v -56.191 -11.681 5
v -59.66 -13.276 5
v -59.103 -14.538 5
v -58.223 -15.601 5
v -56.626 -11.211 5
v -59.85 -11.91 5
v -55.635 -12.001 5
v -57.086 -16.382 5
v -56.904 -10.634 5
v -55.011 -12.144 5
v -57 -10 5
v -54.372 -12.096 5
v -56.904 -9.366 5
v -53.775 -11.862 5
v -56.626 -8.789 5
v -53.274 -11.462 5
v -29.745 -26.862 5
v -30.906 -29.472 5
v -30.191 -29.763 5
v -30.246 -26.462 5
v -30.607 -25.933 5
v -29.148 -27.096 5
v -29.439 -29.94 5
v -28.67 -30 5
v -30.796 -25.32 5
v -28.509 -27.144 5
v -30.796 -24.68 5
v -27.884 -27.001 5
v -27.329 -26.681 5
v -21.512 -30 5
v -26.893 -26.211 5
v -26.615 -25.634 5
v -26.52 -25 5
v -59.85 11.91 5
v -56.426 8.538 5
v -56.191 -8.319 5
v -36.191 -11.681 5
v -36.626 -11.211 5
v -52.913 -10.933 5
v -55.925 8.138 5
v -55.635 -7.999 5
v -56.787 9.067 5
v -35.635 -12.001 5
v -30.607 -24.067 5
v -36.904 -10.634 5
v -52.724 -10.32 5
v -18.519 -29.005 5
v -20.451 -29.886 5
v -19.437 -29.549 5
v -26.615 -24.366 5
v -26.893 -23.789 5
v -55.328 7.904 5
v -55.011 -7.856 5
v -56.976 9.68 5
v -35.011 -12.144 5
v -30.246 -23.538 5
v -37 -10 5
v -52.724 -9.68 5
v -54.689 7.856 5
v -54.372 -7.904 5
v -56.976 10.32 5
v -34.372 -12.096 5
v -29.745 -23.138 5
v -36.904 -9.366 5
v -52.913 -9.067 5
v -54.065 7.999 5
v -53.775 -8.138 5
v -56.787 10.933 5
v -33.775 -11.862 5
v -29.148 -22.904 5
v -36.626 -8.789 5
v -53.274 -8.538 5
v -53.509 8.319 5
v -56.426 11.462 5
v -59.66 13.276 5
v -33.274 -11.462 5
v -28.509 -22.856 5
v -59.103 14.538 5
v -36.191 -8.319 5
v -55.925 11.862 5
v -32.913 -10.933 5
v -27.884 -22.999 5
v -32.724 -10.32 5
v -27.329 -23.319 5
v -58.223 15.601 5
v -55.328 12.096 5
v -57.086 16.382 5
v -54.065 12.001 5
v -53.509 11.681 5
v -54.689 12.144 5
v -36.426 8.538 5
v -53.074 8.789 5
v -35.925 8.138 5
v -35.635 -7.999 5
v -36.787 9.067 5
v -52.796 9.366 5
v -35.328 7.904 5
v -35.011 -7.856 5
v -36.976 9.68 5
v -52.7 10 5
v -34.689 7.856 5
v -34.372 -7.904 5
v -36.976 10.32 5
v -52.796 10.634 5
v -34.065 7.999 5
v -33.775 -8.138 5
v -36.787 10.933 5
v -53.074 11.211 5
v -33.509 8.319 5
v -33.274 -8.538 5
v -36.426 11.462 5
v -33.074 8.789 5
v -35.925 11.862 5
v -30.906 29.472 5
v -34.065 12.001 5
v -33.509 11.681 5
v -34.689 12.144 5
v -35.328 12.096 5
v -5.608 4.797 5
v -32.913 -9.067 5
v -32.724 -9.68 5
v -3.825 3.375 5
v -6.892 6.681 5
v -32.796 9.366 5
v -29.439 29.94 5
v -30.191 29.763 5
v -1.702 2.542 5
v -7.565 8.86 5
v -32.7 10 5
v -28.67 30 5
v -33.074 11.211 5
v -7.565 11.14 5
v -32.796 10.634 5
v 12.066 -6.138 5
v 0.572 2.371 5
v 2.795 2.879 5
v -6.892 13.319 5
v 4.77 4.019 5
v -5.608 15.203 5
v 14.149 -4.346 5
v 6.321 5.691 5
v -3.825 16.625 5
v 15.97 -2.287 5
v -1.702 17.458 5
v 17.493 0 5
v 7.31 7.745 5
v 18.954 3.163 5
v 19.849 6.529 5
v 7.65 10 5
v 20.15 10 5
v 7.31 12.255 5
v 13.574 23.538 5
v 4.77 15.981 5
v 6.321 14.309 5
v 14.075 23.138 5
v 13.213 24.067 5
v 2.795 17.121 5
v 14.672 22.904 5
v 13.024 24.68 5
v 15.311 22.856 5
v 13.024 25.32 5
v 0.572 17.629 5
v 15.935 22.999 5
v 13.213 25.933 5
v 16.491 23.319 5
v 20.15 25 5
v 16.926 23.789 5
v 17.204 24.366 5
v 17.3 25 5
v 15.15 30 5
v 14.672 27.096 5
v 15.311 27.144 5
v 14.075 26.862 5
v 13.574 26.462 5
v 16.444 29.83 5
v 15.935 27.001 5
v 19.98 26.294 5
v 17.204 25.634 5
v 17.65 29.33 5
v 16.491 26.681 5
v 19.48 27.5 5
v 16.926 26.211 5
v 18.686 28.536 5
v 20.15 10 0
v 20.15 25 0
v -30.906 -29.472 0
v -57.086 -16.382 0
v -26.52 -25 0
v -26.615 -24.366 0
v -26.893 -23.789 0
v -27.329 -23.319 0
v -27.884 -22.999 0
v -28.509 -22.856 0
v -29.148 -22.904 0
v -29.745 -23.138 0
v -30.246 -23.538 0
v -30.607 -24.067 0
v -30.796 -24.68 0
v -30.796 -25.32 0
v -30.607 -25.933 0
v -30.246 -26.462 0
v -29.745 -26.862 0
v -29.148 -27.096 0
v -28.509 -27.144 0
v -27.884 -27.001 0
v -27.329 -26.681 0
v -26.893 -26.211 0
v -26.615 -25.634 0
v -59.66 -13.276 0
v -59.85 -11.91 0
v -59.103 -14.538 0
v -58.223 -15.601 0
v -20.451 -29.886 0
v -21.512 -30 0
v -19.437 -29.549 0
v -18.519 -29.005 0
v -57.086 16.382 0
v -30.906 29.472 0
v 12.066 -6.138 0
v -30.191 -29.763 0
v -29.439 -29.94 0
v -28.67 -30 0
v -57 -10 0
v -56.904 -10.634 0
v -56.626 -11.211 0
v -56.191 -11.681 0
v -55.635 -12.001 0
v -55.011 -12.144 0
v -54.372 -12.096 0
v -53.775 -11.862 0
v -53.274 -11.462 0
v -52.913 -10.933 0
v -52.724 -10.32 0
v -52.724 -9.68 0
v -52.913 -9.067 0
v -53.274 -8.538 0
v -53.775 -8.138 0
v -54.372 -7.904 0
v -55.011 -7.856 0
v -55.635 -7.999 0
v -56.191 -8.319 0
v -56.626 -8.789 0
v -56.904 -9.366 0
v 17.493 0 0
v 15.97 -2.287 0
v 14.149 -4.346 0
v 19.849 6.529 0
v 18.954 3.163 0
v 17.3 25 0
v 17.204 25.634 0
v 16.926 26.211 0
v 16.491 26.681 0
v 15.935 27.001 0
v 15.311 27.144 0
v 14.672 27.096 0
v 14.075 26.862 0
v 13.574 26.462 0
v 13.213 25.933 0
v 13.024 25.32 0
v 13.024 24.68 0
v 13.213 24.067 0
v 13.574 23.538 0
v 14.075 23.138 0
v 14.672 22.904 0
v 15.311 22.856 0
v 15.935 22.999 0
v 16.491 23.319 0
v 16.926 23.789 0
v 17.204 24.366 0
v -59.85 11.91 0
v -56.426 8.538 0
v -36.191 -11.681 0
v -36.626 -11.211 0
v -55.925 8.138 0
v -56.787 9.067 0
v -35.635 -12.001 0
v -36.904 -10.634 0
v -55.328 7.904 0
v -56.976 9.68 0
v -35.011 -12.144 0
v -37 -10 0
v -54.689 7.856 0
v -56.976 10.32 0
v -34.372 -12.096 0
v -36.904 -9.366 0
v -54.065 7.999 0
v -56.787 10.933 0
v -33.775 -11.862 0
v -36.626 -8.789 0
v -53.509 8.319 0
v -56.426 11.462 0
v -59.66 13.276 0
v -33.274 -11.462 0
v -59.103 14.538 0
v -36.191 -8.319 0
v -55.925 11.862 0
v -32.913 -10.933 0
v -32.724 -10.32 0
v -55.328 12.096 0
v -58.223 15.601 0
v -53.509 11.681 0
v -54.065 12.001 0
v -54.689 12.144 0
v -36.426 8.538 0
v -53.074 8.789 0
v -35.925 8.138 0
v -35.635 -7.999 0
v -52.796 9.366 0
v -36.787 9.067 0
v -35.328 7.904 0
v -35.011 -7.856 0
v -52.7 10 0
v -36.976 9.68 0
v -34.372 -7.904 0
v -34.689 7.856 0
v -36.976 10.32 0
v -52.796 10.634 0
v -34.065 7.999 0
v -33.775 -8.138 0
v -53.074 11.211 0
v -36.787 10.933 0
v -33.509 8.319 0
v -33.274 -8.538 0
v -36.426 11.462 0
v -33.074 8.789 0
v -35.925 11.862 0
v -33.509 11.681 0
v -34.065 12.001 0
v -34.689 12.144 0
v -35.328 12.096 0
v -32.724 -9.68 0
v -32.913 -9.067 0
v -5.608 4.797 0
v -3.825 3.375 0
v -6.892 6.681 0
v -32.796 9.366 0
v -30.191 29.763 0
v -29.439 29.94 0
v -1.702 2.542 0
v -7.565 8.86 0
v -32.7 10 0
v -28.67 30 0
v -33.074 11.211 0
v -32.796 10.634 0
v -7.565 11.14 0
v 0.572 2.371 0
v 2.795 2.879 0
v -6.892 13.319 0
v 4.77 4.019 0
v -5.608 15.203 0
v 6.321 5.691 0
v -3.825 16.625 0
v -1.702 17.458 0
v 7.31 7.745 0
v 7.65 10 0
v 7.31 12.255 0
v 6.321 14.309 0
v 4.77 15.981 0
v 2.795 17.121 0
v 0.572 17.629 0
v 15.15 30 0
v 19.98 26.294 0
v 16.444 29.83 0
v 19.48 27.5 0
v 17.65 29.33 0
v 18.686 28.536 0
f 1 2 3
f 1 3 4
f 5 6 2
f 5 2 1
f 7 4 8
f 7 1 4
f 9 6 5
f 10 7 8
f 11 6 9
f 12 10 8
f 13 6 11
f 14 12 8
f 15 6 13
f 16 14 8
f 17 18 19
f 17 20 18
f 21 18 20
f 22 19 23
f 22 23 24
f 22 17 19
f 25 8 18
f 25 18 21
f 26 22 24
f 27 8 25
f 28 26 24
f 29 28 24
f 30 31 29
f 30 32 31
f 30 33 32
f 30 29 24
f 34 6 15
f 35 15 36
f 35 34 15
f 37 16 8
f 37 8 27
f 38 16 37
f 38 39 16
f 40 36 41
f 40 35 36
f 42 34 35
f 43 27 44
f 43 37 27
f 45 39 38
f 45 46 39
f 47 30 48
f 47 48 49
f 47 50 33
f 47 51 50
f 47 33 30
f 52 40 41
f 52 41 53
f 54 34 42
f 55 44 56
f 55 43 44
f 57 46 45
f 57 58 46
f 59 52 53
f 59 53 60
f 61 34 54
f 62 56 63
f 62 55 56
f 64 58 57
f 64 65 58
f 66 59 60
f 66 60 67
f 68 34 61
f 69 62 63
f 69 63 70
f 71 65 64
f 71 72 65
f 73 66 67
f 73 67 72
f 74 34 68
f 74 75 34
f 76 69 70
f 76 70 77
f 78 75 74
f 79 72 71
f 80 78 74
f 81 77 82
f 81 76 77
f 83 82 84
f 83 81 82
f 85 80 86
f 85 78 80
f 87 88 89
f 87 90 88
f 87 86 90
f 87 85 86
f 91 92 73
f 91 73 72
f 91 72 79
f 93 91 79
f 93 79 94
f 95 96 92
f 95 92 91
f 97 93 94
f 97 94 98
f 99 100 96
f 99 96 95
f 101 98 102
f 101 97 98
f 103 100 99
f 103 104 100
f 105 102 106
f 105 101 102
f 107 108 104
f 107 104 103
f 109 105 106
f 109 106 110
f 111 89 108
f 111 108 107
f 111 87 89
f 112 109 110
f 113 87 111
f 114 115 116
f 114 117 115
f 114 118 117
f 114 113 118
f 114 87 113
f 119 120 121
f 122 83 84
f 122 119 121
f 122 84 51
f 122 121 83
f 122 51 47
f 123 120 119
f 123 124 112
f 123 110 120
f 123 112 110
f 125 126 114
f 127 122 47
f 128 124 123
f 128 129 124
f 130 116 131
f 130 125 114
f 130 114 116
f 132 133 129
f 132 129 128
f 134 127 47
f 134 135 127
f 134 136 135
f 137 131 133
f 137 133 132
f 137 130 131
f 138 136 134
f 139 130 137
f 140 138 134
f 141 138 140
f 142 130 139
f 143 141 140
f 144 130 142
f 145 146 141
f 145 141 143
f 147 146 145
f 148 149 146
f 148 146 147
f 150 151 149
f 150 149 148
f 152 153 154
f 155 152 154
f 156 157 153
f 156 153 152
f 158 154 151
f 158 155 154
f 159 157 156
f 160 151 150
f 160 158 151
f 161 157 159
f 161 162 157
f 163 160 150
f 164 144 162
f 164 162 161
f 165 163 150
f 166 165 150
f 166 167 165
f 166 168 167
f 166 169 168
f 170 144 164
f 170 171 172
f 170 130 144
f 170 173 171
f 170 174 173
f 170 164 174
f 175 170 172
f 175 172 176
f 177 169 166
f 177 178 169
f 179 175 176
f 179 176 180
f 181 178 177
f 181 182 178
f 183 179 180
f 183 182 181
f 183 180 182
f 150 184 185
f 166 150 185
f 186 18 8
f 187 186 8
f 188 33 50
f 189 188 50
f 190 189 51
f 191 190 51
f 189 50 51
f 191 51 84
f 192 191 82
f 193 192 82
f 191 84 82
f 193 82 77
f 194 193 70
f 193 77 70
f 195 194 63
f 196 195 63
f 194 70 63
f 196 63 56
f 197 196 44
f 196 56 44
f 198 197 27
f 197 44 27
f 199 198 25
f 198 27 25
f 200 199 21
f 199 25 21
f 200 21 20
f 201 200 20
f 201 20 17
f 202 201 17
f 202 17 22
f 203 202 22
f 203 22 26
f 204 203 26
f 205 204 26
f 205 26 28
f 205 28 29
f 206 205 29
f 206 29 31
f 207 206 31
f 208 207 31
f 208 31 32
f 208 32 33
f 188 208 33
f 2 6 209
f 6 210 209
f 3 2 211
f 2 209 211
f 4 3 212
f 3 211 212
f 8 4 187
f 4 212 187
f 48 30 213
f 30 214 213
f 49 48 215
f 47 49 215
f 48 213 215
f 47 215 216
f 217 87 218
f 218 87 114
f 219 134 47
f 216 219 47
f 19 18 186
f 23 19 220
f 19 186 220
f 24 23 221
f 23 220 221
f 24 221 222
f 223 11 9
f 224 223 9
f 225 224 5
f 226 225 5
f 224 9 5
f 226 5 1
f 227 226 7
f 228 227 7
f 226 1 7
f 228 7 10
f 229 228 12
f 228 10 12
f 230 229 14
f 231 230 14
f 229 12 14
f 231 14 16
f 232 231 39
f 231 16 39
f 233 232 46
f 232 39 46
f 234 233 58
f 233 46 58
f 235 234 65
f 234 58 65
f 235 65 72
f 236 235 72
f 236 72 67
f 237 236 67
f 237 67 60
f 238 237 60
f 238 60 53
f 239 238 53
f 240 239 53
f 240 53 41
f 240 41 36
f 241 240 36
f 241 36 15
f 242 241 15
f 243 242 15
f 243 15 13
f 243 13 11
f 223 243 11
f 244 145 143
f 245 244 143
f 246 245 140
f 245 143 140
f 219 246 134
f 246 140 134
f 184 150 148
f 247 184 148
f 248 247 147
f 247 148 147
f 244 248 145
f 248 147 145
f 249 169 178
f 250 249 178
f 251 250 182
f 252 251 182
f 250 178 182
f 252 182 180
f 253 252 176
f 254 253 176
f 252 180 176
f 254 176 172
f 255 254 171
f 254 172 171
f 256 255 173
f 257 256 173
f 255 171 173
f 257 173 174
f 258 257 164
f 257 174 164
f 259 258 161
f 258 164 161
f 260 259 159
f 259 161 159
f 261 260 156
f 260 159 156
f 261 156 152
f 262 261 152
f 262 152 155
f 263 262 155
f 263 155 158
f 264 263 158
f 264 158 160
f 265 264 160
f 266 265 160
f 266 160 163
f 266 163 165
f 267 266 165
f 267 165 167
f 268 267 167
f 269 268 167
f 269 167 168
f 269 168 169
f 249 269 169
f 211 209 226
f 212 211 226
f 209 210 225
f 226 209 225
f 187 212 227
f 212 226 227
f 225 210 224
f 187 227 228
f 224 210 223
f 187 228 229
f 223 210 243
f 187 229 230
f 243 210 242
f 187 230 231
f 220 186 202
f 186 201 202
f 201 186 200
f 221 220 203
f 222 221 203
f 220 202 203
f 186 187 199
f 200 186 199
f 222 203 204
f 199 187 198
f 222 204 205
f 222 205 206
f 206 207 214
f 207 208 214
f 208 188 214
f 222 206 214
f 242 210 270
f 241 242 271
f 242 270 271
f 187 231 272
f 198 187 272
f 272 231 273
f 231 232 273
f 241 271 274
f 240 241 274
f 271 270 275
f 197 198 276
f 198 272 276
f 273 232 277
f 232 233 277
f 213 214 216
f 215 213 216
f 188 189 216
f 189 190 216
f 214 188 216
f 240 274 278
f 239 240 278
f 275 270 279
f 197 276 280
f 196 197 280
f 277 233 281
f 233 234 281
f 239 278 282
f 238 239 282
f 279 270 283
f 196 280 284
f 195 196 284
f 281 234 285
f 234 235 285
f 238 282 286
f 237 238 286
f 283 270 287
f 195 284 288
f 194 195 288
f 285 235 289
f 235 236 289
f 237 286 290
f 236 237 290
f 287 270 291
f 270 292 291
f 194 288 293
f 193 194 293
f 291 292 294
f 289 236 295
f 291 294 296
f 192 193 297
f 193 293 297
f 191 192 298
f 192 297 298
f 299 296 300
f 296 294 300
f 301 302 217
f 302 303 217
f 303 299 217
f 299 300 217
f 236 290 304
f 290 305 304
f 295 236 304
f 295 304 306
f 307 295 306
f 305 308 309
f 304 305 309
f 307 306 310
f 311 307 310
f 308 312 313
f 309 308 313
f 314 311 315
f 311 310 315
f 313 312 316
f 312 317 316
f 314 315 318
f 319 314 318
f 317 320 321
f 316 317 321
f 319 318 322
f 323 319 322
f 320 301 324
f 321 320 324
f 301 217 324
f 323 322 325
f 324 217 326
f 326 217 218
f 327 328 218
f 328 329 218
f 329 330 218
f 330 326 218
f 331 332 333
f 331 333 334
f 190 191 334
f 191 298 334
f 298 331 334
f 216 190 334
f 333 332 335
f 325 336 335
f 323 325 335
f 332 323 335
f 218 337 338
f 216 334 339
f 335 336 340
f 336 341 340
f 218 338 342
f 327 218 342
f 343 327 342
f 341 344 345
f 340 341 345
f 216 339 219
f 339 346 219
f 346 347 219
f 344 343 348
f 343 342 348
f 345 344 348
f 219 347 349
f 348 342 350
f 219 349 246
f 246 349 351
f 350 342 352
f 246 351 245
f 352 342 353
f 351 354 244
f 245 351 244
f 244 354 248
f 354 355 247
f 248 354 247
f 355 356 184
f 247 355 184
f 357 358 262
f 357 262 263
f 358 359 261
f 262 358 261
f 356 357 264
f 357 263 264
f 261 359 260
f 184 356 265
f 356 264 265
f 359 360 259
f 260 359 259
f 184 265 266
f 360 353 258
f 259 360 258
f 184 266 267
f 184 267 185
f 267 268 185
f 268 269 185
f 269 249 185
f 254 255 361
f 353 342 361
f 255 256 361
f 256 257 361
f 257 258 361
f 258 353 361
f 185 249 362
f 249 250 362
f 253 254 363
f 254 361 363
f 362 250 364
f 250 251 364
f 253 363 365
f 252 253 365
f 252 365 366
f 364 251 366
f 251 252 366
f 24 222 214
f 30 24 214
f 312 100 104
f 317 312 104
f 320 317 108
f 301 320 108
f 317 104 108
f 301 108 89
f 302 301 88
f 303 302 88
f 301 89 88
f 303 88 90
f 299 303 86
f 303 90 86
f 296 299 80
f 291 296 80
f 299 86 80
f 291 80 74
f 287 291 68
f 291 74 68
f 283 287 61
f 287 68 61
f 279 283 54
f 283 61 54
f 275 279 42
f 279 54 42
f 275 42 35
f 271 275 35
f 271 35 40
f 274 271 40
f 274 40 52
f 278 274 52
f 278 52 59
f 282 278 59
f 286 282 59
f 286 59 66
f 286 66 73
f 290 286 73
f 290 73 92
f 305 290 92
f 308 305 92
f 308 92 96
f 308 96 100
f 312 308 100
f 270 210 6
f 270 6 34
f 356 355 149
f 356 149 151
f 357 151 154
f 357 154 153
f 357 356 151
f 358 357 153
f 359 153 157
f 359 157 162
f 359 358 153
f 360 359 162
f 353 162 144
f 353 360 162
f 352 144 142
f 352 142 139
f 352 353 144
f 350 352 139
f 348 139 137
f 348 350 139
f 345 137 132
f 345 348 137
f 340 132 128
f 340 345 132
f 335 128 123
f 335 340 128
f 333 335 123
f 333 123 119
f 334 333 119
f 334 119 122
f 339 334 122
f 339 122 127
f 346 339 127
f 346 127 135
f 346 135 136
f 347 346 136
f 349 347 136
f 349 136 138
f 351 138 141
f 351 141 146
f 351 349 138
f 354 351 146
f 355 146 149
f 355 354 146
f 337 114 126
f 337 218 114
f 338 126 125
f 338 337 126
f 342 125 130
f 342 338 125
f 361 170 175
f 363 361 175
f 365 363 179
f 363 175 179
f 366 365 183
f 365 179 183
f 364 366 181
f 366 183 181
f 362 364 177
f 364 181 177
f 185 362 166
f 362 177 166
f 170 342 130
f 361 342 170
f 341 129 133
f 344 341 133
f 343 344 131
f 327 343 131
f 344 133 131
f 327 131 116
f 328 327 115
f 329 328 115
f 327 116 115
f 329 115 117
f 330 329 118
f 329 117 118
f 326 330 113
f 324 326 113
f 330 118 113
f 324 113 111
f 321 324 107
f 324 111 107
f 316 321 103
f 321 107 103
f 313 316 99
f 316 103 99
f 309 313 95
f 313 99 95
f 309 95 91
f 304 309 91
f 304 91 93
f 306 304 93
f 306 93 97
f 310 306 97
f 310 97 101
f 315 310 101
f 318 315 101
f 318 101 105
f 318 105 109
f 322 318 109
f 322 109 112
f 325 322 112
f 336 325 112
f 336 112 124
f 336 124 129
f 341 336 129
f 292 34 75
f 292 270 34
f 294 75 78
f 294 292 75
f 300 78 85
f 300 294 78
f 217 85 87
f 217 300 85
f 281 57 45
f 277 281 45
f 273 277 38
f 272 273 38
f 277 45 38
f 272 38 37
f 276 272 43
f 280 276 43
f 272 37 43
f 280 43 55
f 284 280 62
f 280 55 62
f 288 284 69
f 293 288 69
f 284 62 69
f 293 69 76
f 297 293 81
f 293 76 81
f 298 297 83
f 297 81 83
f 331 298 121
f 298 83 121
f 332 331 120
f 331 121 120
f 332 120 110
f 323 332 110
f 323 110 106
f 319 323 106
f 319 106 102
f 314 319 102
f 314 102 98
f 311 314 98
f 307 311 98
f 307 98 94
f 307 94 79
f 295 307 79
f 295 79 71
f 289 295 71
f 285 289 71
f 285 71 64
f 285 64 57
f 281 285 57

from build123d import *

# Parameters (mm, degrees)
SKETCH_1_W          = 80
SKETCH_1_H          = 60
SKETCH_1_R          = 7.65
EXTRUDE_1_DEPTH     = 5
SKETCH_2_R          = 2.15
CUT_EXTRUDE_1_DEPTH = 68.134361545
SKETCH_3_R          = 2.15
CUT_EXTRUDE_2_DEPTH = 68.134361545
CUT_EXTRUDE_3_DEPTH = 68.134361545
SKETCH_6_R          = 2.15
CUT_EXTRUDE_5_DEPTH = 68.134361545
FILLET_1_R          = 5


with BuildPart() as part:
    # ｽｹｯﾁ1 → ﾎﾞｽ - 押し出し1 (new body)
    with BuildSketch(Plane.XY):
        with Locations((-19.85, 0)):
            Rectangle(SKETCH_1_W, SKETCH_1_H)
        with Locations((0, 10)):
            Circle(SKETCH_1_R, mode=Mode.SUBTRACT)
    extrude(amount=EXTRUDE_1_DEPTH)

    # ｽｹｯﾁ2 → ｶｯﾄ - 押し出し1 (cut, through all)
    with BuildSketch(Plane.XY.offset(5)):
        with Locations((-54.85, 10)):
            Circle(SKETCH_2_R)
        with Locations(Location((-54.85, -10, 0), (0, 0, 180))):
            Circle(SKETCH_2_R)
        with Locations((-34.85, 10)):
            Circle(SKETCH_2_R)
        with Locations(Location((-34.85, -10, 0), (0, 0, 180))):
            Circle(SKETCH_2_R)
    extrude(amount=-CUT_EXTRUDE_1_DEPTH, mode=Mode.SUBTRACT)

    # ｽｹｯﾁ3 → ｶｯﾄ - 押し出し2 (cut, through all)
    with BuildSketch(Plane.XY.offset(5)):
        with Locations((15.15, 25)):
            Circle(SKETCH_3_R)
        with BuildLine():
            ThreePointArc((15.15, 30), (18.685533906, 28.535533906), (20.15, 25))
            Line((20.15, 25), (20.15, 30))
            Line((20.15, 30), (15.15, 30))
        make_face()
    extrude(amount=-CUT_EXTRUDE_2_DEPTH, mode=Mode.SUBTRACT)

    # ｽｹｯﾁ4 → ｶｯﾄ - 押し出し3 (cut, through all)
    with BuildSketch(Plane.XY.offset(5)):
        Polygon((-59.85, 30), (-59.85, 15), (-29.85, 30), align=None)
        Polygon((-29.85, -30), (-59.85, -15), (-59.85, -30), align=None)
        with BuildLine():
            Line((20.15, 0), (17.493498792, 0))
            ThreePointArc((17.493498792, 0), (15.094907291, -3.347893986), (12.06572435, -6.138178209))
            Line((12.06572435, -6.138178209), (-19.85, -30))
            Line((-19.85, -30), (20.15, -30))
            Line((20.15, -30), (20.15, 0))
        make_face()
        with BuildLine():
            ThreePointArc((20.15, 10), (19.474553919, 4.8265824), (17.493498792, 0))
            Line((17.493498792, 0), (20.15, 0))
            Line((20.15, 0), (20.15, 10))
        make_face()
    extrude(amount=-CUT_EXTRUDE_3_DEPTH, mode=Mode.SUBTRACT)

    # ｽｹｯﾁ6 → ｶｯﾄ - 押し出し5 (cut, through all)
    with BuildSketch(Plane.XY.offset(5)):
        with Locations((-28.669660113, -25)):
            Circle(SKETCH_6_R)
    extrude(amount=-CUT_EXTRUDE_5_DEPTH, mode=Mode.SUBTRACT)

    # ﾌｨﾚｯﾄ1
    fillet_1_edges = [part.edges().sort_by_distance(p)[0] for p in [
        (-59.85, 15, 2.5),
        (-29.85, 30, 2.5),
        (-59.85, -15, 2.5),
        (-29.85, -30, 2.5),
        (-19.85, -30, 2.5),
    ]]
    fillet(fillet_1_edges, radius=FILLET_1_R)


solid = part.part
